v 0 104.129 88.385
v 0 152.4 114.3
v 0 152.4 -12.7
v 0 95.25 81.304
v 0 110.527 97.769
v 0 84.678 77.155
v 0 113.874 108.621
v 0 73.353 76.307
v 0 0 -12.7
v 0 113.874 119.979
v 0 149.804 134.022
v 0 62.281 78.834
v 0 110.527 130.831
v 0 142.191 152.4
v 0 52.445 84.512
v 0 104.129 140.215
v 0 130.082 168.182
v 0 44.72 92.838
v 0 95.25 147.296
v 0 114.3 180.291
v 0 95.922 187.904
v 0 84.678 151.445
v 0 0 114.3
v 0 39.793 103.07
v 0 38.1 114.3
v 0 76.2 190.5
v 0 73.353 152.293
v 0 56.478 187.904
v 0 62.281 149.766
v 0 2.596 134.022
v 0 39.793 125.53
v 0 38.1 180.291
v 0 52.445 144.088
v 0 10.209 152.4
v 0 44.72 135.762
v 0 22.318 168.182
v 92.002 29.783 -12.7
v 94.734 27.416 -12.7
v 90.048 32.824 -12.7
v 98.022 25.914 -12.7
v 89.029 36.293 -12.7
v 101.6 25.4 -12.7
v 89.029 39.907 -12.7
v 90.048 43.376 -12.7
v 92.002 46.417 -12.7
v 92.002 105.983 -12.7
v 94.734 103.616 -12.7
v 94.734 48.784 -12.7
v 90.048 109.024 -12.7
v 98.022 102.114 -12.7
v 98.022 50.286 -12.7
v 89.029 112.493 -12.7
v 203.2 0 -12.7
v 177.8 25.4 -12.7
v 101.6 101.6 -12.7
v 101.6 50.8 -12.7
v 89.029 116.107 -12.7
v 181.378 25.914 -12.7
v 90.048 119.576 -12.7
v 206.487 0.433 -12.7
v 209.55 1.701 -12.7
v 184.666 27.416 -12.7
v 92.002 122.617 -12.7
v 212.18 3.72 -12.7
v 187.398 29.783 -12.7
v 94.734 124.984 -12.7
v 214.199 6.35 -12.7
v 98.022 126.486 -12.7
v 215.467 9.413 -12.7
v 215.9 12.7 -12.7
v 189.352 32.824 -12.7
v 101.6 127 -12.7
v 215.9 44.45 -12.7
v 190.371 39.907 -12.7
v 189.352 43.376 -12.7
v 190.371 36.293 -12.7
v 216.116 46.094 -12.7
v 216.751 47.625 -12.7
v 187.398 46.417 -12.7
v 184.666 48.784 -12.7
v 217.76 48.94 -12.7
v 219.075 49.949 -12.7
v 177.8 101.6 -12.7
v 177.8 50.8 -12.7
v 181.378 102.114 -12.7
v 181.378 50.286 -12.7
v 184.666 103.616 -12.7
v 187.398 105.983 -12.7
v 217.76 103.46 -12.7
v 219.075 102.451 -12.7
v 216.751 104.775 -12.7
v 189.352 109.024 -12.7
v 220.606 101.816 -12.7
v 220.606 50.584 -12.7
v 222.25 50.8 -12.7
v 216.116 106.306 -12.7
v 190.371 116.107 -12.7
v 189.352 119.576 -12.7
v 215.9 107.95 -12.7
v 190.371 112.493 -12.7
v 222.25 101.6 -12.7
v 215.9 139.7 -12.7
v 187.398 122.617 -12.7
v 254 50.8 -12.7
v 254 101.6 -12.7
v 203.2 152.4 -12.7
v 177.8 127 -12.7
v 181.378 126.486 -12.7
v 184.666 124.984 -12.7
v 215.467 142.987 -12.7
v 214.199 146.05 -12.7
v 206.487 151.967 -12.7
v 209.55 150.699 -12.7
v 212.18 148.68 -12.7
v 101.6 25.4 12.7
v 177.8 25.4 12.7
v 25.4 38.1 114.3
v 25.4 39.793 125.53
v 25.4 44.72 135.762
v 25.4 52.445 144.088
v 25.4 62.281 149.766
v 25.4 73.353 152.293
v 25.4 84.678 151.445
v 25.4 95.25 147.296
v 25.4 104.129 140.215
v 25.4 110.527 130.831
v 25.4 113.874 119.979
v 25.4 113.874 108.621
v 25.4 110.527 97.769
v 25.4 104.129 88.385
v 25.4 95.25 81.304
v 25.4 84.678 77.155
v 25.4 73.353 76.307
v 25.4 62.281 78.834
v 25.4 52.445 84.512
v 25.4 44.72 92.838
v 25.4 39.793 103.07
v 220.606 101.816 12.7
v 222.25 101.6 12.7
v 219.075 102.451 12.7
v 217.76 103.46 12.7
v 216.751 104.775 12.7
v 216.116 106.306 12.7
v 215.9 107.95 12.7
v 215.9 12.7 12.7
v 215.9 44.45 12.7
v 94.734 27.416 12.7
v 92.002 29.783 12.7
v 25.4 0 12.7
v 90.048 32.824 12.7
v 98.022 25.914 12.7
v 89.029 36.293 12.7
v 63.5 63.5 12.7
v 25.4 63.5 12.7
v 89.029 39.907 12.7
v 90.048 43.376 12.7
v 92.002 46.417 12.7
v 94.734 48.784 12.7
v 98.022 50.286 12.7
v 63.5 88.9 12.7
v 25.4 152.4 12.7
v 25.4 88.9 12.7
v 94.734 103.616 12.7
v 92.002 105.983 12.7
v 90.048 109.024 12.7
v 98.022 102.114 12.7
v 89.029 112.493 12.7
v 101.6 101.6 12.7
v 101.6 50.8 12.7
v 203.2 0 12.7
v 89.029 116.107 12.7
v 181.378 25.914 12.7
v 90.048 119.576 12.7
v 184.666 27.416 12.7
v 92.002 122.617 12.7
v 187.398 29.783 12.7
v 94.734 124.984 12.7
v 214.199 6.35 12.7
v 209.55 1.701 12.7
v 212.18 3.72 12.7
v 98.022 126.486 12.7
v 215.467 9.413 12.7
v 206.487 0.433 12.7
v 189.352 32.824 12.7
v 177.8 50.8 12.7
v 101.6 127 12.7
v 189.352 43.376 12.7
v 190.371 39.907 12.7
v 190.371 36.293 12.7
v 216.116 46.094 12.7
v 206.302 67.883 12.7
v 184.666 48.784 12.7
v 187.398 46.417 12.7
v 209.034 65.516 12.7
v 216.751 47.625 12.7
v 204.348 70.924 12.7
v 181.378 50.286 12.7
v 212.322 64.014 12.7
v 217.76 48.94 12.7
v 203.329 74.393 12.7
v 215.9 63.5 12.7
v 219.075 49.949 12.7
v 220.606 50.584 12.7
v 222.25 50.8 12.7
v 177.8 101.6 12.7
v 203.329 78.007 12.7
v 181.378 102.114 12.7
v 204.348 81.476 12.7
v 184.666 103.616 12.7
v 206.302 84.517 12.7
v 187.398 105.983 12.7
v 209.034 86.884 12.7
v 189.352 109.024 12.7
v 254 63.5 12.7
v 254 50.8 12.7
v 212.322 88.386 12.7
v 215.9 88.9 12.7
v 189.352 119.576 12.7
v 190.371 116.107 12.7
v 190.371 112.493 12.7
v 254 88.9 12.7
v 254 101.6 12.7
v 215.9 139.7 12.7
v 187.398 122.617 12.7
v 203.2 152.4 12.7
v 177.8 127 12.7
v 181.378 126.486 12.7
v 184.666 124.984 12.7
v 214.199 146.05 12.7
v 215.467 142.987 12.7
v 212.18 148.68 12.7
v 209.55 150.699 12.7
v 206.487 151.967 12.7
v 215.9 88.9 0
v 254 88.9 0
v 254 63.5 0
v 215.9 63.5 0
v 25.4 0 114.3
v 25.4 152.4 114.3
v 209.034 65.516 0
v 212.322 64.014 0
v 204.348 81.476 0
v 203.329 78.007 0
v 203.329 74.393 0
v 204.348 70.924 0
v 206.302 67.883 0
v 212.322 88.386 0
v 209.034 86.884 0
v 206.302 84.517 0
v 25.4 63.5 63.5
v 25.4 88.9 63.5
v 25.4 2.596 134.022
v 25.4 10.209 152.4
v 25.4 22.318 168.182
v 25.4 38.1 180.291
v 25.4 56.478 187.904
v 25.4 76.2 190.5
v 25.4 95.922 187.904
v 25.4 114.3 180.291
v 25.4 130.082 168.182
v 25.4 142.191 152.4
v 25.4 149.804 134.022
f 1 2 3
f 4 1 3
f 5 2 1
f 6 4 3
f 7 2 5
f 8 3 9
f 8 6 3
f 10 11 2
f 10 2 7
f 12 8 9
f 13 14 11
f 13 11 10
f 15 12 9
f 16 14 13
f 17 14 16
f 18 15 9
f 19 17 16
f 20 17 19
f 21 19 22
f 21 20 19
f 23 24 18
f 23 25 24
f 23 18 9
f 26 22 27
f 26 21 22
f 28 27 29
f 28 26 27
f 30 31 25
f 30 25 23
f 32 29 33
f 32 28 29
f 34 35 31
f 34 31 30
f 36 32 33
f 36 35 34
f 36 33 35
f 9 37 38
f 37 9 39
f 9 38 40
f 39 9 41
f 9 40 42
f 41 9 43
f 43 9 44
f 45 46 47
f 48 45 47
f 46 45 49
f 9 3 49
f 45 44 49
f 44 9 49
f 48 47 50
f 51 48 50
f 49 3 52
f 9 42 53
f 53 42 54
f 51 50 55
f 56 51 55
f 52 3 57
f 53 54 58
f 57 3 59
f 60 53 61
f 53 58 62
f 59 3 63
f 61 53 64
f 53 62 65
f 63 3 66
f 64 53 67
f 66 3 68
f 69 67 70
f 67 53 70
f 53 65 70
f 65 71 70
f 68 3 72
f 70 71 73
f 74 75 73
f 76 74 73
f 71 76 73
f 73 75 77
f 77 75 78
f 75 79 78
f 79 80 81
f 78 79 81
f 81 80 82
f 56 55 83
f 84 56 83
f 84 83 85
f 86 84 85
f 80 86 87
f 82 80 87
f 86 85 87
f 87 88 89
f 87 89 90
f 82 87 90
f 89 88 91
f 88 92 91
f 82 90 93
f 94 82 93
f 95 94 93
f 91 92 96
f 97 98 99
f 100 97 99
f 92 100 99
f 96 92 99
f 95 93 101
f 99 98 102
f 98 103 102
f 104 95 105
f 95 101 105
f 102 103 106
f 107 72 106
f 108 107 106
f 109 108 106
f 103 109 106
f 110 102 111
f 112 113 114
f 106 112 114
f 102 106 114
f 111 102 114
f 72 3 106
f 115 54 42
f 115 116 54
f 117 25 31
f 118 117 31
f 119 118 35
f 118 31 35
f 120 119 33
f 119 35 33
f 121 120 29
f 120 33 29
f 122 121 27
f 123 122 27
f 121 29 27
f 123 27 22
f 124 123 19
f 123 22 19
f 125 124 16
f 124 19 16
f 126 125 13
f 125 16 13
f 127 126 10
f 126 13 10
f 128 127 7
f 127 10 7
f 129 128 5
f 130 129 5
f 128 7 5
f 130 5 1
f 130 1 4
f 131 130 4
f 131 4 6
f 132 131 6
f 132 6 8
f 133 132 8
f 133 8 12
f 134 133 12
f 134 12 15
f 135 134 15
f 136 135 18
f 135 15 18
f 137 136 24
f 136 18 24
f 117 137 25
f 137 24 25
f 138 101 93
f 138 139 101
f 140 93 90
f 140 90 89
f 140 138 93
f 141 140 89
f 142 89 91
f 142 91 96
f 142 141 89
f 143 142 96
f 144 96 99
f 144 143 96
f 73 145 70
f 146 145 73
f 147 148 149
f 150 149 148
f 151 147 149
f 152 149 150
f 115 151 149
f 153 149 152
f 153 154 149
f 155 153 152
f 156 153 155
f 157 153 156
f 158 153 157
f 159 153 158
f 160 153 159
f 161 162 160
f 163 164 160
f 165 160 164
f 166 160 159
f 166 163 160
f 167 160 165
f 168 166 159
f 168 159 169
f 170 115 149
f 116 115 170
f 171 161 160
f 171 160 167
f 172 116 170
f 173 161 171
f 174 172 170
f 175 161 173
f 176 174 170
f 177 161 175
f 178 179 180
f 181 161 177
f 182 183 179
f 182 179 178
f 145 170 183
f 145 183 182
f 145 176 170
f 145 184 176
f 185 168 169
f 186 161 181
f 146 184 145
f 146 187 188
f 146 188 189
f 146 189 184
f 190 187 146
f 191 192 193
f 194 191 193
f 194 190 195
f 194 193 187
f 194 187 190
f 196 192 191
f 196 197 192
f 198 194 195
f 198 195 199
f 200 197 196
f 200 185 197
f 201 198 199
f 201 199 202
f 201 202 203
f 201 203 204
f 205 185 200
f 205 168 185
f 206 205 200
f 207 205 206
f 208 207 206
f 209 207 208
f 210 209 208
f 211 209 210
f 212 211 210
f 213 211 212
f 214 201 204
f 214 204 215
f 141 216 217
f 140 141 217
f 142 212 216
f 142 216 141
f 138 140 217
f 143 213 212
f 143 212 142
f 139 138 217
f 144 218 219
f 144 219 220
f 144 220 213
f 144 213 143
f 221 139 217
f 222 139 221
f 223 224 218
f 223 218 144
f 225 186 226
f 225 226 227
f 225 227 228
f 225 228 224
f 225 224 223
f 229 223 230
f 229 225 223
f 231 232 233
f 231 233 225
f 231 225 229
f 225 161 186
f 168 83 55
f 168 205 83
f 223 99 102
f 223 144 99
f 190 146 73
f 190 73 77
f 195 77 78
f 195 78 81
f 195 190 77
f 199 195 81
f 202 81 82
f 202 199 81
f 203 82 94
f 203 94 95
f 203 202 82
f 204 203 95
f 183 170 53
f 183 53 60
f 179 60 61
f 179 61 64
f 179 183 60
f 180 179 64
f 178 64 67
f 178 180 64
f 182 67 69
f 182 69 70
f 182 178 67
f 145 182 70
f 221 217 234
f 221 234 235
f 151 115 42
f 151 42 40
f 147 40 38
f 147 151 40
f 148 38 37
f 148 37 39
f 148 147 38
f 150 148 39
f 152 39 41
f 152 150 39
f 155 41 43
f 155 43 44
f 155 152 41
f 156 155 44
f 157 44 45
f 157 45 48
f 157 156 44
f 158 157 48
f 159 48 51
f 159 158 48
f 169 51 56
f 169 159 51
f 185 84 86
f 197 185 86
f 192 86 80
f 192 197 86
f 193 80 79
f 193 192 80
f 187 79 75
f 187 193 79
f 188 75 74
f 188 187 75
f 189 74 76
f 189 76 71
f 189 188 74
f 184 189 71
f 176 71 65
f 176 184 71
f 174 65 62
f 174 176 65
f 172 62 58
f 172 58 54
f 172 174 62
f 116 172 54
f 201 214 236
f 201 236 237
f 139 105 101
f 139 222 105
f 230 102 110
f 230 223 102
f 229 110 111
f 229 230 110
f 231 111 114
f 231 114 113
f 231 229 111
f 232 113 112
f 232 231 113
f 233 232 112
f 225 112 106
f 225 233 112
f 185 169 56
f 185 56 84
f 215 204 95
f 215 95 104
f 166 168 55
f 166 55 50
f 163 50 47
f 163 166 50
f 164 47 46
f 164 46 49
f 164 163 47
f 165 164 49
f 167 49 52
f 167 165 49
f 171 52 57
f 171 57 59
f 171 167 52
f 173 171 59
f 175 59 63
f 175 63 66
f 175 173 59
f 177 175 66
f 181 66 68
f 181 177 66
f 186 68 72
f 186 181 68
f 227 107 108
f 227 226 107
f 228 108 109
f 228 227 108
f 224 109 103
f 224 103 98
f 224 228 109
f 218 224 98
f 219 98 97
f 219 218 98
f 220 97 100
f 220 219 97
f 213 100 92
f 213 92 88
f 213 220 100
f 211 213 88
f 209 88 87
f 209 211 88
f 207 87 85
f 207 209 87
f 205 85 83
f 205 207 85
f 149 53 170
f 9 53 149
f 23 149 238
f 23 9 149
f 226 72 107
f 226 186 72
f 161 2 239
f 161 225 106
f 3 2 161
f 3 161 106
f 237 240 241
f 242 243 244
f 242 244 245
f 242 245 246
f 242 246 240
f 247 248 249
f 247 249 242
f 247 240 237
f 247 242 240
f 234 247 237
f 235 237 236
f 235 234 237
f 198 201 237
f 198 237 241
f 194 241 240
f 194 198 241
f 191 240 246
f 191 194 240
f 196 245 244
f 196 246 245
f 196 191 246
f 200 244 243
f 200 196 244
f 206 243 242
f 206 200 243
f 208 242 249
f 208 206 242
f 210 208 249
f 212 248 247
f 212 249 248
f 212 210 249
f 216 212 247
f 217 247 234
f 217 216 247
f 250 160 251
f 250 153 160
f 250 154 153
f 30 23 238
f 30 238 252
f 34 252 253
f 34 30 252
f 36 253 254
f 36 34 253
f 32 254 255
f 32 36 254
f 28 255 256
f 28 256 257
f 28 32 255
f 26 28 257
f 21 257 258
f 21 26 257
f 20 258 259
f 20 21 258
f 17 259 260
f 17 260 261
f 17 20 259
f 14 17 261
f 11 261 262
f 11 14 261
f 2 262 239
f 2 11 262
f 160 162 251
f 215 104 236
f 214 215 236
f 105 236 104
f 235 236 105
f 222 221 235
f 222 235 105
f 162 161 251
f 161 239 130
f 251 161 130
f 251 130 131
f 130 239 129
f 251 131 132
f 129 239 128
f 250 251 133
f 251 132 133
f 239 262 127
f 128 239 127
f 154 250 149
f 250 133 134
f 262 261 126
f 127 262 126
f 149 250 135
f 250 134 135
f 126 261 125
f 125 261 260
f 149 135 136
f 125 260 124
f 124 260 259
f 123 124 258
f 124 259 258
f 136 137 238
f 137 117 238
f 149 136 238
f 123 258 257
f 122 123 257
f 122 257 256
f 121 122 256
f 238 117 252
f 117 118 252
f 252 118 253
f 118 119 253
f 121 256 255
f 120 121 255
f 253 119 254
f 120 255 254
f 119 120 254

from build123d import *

# Parameters (mm, degrees)
F1_DEPTH = 12.7
F2_DEPTH = 12.7
F3_R     = 38.1
F4_DEPTH = 25.4
F7_DEPTH = 12.7


with BuildPart() as f1:
    # F0 (on Top) → F1 (new body, symmetric)
    with BuildSketch(Plane.XY):
        with BuildLine():
            Line((0, 152.4), (0, 0))
            Line((0, 0), (203.2, 0))
            ThreePointArc((203.2, 0), (212.1802561211, 3.7197438789), (215.9, 12.7))
            Line((215.9, 12.7), (215.9, 44.45))
            ThreePointArc((215.9, 44.45), (217.7598719395, 48.9401280605), (222.25, 50.8))
            Line((222.25, 50.8), (254, 50.8))
            Line((254, 50.8), (254, 63.5))
            Line((254, 63.5), (215.9, 63.5))
            ThreePointArc((215.9, 63.5), (203.2, 76.2), (215.9, 88.9))
            Line((215.9, 88.9), (254, 88.9))
            Line((254, 88.9), (254, 101.6))
            Line((254, 101.6), (222.25, 101.6))
            ThreePointArc((222.25, 101.6), (217.7598719395, 103.4598719395), (215.9, 107.95))
            Line((215.9, 107.95), (215.9, 139.7))
            ThreePointArc((215.9, 139.7), (212.1802561211, 148.6802561211), (203.2, 152.4))
            Line((203.2, 152.4), (0, 152.4))
        make_face()
        with BuildLine():
            ThreePointArc((101.6, 25.4), (88.9, 38.1), (101.6, 50.8))
            Line((101.6, 50.8), (177.8, 50.8))
            ThreePointArc((177.8, 50.8), (190.5, 38.1), (177.8, 25.4))
            Line((177.8, 25.4), (101.6, 25.4))
        make_face(mode=Mode.SUBTRACT)
        with BuildLine():
            ThreePointArc((101.6, 101.6), (88.9, 114.3), (101.6, 127))
            Line((101.6, 127), (177.8, 127))
            ThreePointArc((177.8, 127), (190.5, 114.3), (177.8, 101.6))
            Line((177.8, 101.6), (101.6, 101.6))
        make_face(mode=Mode.SUBTRACT)
    extrude(amount=F1_DEPTH, both=True)

    # F0 (on Top) → F2 (join)
    with BuildSketch(Plane.XY):
        with BuildLine():
            Line((215.9, 63.5), (254, 63.5))
            Line((254, 63.5), (254, 88.9))
            Line((254, 88.9), (215.9, 88.9))
            ThreePointArc((215.9, 88.9), (203.2, 76.2), (215.9, 63.5))
        make_face()
    extrude(amount=-F2_DEPTH)

    # F3 (on face) → F4 (join)
    with BuildSketch(Plane(origin=(0, 0, 0), x_dir=(0, -1, 0), z_dir=(-1, 0, 0))):
        with BuildLine():
            Line((-152.4, 12.7), (0, 12.7))
            Line((0, 12.7), (0, 114.3))
            ThreePointArc((0, 114.3), (-76.2, 190.5), (-152.4, 114.3))
            Line((-152.4, 114.3), (-152.4, 12.7))
        make_face()
        with Locations((-76.2, 114.3)):
            Circle(F3_R, mode=Mode.SUBTRACT)
    extrude(amount=-F4_DEPTH)

    # F6 (on offset) → F7 (join, symmetric)
    with BuildSketch(Plane.XZ.offset(-76.2)):
        Polygon((63.5, 12.7), (25.4, 63.5), (25.4, 12.7), align=None)
    extrude(amount=F7_DEPTH, both=True)


solid = f1.part
